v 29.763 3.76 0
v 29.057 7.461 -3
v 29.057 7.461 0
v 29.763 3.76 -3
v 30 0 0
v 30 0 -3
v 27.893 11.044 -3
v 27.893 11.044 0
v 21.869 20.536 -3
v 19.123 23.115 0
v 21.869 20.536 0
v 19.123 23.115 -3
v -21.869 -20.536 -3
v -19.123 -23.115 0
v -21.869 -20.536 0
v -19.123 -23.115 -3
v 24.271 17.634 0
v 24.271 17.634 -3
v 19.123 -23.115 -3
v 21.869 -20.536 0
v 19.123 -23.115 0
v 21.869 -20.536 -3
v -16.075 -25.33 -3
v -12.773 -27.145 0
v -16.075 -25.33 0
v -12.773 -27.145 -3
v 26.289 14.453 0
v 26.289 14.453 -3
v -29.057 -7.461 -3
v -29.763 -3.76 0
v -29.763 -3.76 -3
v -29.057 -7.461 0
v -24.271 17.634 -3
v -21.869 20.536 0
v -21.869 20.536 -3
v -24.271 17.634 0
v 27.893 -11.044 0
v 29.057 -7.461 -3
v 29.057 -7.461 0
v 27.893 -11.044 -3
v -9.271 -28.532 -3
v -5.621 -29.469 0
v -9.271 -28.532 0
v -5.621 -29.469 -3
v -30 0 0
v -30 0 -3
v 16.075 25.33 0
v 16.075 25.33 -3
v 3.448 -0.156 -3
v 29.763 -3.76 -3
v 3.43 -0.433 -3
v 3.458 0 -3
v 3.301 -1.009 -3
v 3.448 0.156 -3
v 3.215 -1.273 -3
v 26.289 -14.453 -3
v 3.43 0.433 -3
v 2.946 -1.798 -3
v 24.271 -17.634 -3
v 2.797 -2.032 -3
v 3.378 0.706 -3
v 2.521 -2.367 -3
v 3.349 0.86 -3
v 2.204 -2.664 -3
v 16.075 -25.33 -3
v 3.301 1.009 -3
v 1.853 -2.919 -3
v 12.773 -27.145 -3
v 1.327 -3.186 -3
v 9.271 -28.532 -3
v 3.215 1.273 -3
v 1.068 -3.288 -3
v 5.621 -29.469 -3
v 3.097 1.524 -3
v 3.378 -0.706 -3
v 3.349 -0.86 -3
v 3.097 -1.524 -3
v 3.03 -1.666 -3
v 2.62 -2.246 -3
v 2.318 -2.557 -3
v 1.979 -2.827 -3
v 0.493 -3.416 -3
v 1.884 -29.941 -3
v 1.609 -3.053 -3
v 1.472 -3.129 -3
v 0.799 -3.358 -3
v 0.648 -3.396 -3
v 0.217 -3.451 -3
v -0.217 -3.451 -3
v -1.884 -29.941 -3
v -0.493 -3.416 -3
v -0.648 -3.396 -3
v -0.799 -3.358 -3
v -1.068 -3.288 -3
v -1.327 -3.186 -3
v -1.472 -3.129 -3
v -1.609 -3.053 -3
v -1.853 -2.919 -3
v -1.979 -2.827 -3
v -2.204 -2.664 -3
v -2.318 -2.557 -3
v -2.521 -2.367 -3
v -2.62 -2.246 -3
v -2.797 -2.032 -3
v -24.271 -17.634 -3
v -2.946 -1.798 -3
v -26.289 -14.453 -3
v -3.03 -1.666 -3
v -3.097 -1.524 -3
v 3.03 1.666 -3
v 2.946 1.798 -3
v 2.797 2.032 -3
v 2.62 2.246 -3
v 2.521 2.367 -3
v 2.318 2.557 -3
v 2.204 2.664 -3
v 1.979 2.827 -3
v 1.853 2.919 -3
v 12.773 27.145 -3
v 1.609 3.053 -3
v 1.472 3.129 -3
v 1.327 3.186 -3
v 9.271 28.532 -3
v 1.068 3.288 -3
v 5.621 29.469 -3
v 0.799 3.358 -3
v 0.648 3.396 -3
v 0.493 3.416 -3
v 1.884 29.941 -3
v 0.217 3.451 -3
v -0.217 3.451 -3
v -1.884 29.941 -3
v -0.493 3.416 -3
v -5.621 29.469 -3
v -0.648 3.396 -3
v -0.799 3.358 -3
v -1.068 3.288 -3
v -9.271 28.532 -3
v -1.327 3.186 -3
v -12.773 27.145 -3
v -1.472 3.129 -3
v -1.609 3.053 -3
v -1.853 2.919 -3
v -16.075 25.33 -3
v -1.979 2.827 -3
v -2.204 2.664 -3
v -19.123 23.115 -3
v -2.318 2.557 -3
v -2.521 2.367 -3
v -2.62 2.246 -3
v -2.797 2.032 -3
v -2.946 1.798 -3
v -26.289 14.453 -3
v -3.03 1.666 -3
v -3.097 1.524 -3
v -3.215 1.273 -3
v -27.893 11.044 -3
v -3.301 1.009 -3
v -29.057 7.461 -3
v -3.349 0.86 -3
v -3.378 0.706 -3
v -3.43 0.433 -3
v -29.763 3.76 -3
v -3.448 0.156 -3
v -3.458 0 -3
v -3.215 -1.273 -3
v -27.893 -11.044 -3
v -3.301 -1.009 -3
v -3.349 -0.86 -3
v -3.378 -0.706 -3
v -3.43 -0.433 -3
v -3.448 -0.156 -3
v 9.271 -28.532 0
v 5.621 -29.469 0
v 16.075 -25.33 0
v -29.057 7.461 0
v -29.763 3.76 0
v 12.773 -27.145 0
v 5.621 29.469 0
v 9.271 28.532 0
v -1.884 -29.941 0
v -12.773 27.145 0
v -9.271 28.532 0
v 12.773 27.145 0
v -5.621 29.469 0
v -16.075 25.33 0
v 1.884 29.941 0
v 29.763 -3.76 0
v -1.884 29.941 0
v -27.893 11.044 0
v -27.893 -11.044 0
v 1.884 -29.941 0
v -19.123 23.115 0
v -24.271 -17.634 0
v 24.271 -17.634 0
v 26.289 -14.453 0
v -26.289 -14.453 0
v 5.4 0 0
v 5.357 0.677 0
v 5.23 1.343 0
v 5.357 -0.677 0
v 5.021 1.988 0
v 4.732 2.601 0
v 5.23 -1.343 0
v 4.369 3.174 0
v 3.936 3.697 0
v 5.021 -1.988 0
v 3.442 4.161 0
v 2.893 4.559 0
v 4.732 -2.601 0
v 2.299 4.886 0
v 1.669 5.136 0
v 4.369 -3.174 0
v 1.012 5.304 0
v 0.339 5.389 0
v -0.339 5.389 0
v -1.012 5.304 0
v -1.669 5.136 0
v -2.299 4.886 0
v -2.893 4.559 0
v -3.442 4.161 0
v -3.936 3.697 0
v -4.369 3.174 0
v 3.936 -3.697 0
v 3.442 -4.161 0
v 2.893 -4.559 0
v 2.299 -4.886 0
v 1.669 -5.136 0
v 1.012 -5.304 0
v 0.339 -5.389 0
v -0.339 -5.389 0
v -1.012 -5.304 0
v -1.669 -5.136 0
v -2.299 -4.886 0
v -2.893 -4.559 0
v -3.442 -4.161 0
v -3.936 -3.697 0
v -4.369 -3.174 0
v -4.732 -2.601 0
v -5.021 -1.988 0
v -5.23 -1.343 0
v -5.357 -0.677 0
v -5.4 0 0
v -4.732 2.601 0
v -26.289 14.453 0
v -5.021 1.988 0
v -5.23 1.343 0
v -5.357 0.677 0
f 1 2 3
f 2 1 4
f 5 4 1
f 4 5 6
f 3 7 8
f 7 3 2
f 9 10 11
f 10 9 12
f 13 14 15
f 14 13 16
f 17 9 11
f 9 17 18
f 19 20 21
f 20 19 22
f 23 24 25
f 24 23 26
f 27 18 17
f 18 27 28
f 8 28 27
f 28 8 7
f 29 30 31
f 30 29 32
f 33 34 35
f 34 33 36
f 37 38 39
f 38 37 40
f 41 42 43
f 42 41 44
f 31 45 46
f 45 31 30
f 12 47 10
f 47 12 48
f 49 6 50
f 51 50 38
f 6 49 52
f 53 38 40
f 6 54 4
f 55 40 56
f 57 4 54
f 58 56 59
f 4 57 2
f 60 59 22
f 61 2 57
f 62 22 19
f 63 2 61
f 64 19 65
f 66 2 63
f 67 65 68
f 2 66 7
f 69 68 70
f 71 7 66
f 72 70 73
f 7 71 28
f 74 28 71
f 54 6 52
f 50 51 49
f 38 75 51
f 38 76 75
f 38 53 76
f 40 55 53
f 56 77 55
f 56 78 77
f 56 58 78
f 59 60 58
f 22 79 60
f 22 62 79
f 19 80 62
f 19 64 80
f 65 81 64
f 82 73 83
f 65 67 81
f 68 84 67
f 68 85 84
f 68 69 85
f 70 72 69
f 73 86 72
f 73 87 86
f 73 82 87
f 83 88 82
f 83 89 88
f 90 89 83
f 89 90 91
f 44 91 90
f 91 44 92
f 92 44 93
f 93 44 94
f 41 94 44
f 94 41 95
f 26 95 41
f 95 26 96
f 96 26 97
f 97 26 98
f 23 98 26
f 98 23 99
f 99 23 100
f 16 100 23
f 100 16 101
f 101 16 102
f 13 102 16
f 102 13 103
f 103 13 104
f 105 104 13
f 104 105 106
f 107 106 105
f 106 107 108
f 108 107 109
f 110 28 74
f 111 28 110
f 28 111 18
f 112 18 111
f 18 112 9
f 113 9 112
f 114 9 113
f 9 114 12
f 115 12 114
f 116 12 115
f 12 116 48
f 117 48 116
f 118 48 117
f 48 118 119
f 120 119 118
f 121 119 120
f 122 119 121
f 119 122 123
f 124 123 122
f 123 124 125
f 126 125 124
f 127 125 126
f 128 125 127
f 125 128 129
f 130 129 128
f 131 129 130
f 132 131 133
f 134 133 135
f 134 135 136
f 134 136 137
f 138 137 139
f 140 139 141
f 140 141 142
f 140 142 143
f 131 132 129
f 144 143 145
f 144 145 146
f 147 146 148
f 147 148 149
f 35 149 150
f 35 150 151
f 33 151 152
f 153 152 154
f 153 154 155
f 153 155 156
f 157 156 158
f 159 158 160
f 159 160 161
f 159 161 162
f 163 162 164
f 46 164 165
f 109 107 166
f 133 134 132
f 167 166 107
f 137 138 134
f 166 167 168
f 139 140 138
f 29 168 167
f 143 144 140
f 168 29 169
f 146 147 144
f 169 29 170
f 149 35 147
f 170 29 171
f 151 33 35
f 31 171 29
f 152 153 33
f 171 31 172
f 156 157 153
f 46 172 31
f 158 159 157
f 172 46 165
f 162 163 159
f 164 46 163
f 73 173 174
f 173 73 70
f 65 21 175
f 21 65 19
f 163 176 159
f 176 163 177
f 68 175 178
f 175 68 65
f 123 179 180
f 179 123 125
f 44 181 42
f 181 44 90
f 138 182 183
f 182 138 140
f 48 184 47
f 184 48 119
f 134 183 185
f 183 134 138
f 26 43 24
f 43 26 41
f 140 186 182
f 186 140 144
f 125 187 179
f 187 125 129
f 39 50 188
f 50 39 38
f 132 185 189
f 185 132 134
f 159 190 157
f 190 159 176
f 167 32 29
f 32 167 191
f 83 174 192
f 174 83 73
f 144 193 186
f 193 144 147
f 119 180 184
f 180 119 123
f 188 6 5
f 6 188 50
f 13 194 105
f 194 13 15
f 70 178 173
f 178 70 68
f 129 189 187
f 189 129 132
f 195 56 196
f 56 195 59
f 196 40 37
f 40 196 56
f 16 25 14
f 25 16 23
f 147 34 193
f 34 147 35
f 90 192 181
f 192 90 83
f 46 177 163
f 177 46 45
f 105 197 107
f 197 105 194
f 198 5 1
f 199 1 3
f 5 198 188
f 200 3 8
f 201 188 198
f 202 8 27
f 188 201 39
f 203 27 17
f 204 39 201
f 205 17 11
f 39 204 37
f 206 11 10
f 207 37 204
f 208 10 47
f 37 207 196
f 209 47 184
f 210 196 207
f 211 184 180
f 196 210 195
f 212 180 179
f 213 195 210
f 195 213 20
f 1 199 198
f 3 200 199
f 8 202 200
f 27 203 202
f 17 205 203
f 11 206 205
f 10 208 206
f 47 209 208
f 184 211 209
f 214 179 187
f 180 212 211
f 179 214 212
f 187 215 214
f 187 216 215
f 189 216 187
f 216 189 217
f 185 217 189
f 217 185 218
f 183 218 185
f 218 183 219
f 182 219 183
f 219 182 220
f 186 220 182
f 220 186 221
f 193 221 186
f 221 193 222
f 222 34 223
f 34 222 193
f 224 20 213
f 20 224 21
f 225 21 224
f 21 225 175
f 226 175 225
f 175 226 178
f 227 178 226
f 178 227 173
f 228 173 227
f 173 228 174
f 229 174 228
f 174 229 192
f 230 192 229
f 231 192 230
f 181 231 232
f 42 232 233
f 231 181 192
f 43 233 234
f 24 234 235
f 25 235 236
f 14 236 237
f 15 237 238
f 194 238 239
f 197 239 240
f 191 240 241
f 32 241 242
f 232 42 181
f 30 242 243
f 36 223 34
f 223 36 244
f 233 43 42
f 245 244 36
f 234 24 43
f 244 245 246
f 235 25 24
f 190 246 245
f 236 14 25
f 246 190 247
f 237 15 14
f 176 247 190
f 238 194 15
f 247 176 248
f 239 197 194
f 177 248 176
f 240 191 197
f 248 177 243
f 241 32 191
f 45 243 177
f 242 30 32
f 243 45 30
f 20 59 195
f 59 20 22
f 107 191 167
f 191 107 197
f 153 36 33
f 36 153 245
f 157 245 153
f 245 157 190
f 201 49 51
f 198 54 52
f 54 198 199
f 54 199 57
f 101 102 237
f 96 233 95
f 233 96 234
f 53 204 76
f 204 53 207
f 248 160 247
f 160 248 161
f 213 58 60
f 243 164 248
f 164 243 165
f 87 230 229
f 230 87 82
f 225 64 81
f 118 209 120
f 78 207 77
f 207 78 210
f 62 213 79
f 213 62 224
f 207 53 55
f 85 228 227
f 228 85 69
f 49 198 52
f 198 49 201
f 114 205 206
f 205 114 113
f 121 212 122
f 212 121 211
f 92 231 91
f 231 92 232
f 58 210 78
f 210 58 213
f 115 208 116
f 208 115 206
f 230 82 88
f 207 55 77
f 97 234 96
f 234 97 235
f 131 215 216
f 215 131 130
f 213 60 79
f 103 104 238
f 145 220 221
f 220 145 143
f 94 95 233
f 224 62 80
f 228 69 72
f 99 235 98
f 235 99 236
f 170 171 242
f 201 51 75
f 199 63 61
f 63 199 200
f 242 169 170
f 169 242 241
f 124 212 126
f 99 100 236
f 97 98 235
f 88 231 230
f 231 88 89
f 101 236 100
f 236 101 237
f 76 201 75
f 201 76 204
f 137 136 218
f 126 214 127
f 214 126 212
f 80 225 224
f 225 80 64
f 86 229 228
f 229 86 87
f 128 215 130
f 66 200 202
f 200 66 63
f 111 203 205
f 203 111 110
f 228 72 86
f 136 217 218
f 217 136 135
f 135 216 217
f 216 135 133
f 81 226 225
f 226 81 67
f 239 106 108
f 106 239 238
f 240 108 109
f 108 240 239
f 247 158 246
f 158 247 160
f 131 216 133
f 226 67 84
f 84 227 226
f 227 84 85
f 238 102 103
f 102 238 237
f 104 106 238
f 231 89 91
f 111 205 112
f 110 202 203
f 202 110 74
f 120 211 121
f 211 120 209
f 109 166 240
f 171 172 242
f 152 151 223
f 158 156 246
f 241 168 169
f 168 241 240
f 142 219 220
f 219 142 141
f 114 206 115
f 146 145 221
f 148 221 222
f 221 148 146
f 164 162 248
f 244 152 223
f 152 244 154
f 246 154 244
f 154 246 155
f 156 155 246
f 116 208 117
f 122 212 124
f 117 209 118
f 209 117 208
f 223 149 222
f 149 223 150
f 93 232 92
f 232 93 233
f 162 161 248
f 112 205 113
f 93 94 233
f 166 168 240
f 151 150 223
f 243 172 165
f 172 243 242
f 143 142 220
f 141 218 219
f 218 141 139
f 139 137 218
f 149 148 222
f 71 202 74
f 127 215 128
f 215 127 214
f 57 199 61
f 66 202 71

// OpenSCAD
$fn = 50;


difference() {
	union() {
		translate(v = [0, 0, -3.0000000000]) {
			cylinder(h = 3, r = 30.0000000000);
		}
		translate(v = [0, 0, -3.0000000000]) {
			cylinder(h = 3, r = 2.8750000000);
		}
	}
	union() {
		translate(v = [0, 0, 0]) {
			rotate(a = [0, 0, 0]) {
				difference() {
					union() {
						translate(v = [0, 0, -3.0000000000]) {
							cylinder(h = 3, r = 2.6000000000);
						}
						translate(v = [0, 0, -3.9000000000]) {
							cylinder(h = 3.9000000000, r1 = 2.8750000000, r2 = 5.4000000000);
						}
						translate(v = [0, 0, -3.0000000000]) {
							cylinder(h = 3, r = 2.8750000000);
						}
						translate(v = [0, 0, -3.0000000000]) {
							cylinder(h = 3, r = 2.6000000000);
						}
					}
					union();
				}
			}
		}
	}
}
